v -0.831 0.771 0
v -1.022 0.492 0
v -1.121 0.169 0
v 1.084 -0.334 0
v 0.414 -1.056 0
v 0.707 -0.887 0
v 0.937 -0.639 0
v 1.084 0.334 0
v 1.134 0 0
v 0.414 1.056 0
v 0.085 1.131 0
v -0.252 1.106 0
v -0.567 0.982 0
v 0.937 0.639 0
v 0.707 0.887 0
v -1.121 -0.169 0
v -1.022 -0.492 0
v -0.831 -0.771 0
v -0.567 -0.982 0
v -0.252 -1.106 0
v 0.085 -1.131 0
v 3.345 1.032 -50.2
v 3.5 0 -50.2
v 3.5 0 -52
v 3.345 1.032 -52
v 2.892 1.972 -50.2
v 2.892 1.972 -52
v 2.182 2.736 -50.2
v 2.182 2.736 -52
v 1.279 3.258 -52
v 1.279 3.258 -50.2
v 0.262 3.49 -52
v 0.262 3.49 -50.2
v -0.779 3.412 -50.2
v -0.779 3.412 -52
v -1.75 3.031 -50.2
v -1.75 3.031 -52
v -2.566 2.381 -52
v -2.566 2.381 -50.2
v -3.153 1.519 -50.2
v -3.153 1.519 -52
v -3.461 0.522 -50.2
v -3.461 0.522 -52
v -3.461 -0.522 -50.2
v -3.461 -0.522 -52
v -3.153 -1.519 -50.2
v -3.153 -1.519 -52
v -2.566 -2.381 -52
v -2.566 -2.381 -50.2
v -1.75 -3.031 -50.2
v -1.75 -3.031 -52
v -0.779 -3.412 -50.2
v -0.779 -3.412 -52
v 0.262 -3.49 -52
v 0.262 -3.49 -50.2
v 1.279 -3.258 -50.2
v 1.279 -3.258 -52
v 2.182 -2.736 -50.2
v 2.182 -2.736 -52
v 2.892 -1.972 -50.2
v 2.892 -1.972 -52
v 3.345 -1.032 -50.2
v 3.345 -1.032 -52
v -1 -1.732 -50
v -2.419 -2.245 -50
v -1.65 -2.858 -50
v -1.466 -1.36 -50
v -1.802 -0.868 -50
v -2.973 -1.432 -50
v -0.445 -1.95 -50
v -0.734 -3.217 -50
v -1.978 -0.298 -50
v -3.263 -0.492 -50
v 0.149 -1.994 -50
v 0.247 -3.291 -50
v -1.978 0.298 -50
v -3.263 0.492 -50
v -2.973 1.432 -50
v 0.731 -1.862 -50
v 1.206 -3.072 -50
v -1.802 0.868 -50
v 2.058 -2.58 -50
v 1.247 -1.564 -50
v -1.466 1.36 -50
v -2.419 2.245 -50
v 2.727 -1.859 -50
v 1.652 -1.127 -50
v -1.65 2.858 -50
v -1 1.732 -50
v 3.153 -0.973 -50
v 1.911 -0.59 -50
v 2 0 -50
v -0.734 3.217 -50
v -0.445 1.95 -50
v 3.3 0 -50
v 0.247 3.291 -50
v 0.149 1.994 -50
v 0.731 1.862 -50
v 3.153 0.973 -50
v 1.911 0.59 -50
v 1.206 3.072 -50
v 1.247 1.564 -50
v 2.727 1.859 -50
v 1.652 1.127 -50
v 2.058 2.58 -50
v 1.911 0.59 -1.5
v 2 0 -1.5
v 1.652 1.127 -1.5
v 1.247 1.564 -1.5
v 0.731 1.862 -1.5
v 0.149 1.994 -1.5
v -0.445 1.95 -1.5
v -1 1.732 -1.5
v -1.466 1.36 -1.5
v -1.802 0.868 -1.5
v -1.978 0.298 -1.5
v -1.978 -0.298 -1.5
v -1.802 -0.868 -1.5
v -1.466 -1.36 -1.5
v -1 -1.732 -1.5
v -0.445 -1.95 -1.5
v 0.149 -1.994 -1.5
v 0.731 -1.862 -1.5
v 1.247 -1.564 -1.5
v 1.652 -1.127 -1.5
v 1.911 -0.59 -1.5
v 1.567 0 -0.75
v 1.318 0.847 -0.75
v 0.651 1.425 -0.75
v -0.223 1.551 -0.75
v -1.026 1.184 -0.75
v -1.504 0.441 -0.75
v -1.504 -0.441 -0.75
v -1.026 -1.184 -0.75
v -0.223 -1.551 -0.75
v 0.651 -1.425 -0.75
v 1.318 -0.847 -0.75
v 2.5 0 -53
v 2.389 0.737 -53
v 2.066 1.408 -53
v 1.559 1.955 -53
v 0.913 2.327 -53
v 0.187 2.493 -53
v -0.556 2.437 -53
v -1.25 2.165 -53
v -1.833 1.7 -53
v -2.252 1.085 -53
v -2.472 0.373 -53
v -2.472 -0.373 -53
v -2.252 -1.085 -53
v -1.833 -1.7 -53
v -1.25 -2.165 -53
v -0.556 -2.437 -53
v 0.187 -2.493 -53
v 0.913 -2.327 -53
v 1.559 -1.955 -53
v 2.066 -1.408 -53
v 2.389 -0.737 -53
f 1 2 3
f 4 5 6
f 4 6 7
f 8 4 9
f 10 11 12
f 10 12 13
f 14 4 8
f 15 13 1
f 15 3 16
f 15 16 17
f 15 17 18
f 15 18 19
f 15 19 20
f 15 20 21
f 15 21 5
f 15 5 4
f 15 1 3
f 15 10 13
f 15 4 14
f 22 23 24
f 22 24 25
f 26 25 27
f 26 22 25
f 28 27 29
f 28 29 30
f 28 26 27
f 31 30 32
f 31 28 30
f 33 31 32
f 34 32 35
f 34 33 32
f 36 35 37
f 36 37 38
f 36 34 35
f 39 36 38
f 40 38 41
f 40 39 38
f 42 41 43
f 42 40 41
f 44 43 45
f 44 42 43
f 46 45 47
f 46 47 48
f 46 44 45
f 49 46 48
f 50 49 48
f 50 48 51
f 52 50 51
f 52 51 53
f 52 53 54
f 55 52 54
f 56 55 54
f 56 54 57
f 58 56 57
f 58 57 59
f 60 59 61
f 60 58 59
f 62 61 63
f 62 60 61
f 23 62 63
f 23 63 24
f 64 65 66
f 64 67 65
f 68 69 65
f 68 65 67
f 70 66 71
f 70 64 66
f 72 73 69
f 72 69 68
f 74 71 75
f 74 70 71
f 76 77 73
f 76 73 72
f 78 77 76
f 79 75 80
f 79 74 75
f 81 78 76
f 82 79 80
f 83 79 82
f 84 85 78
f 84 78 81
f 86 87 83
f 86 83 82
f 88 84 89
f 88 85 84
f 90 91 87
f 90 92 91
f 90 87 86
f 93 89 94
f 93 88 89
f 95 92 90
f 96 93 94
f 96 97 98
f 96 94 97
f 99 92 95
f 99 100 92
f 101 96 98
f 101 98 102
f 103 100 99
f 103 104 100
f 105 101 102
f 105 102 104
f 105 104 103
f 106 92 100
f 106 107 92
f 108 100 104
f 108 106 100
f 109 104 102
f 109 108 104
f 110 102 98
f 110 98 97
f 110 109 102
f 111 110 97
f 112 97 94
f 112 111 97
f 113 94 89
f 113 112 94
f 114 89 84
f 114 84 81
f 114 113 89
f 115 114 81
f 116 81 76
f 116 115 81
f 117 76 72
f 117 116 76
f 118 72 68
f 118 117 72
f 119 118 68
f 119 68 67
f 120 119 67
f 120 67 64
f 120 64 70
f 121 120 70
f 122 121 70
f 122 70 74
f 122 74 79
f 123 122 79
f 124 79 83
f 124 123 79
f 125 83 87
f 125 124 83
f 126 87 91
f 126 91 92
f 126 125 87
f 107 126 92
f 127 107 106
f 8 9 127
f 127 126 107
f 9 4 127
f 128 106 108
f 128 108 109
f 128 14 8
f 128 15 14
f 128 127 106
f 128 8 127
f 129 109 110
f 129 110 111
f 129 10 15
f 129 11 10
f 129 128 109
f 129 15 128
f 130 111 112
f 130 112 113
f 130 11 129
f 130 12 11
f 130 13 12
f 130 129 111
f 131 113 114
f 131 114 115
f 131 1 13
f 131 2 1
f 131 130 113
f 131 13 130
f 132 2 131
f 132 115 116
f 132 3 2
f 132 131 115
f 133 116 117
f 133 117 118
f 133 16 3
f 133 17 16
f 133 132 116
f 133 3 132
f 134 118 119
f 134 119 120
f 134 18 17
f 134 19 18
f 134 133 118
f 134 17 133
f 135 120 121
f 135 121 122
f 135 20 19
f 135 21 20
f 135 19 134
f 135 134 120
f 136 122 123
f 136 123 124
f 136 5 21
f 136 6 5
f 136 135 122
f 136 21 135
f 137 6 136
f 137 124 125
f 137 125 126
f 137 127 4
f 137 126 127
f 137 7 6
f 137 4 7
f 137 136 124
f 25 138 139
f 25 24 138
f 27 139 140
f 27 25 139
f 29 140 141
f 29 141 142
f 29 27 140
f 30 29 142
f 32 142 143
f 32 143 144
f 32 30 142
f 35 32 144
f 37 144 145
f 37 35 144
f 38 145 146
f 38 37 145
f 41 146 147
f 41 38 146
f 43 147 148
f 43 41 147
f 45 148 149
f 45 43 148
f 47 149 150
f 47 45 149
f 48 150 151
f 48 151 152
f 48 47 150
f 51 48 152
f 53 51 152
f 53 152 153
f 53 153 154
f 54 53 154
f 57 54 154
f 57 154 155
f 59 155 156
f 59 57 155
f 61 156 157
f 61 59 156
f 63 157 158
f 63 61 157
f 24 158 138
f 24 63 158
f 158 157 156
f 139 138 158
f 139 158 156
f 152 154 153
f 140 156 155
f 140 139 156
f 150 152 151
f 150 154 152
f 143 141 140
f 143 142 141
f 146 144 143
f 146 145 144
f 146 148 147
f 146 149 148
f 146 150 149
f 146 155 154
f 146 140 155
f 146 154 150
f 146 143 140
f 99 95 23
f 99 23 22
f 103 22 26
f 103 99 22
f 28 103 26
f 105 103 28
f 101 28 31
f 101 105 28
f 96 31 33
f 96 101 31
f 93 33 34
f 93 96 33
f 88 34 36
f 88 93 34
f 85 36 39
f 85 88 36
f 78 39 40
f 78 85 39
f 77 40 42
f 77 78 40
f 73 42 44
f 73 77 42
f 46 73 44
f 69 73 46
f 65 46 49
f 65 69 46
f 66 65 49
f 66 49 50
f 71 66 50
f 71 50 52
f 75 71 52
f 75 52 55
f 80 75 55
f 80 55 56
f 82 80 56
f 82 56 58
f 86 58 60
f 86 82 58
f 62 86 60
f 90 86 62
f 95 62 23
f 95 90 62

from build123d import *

# Parameters (mm, degrees)
CHAMFER1_SIZE = 0.2


with BuildPart() as part:
    # Sketch1 → Revolve1 (revolve)
    with BuildSketch(Plane(origin=(0, 0, 0), x_dir=(1, 0, 0), z_dir=(0, 1, 0))):
        Polygon((0, 0), (0, 53), (2.5, 53), (3.5, 52), (3.5, 50), (2, 50), (2, 1.5), (1.133974596, 0), align=None)
    revolve(axis=Axis((0, 0, 0), (0, 0, 1)))

    # Chamfer1
    chamfer1_edges = [part.edges().sort_by_distance(p)[0] for p in [
        (-3.5, 0, -50),
    ]]
    chamfer(chamfer1_edges, length=CHAMFER1_SIZE)


solid = part.part
